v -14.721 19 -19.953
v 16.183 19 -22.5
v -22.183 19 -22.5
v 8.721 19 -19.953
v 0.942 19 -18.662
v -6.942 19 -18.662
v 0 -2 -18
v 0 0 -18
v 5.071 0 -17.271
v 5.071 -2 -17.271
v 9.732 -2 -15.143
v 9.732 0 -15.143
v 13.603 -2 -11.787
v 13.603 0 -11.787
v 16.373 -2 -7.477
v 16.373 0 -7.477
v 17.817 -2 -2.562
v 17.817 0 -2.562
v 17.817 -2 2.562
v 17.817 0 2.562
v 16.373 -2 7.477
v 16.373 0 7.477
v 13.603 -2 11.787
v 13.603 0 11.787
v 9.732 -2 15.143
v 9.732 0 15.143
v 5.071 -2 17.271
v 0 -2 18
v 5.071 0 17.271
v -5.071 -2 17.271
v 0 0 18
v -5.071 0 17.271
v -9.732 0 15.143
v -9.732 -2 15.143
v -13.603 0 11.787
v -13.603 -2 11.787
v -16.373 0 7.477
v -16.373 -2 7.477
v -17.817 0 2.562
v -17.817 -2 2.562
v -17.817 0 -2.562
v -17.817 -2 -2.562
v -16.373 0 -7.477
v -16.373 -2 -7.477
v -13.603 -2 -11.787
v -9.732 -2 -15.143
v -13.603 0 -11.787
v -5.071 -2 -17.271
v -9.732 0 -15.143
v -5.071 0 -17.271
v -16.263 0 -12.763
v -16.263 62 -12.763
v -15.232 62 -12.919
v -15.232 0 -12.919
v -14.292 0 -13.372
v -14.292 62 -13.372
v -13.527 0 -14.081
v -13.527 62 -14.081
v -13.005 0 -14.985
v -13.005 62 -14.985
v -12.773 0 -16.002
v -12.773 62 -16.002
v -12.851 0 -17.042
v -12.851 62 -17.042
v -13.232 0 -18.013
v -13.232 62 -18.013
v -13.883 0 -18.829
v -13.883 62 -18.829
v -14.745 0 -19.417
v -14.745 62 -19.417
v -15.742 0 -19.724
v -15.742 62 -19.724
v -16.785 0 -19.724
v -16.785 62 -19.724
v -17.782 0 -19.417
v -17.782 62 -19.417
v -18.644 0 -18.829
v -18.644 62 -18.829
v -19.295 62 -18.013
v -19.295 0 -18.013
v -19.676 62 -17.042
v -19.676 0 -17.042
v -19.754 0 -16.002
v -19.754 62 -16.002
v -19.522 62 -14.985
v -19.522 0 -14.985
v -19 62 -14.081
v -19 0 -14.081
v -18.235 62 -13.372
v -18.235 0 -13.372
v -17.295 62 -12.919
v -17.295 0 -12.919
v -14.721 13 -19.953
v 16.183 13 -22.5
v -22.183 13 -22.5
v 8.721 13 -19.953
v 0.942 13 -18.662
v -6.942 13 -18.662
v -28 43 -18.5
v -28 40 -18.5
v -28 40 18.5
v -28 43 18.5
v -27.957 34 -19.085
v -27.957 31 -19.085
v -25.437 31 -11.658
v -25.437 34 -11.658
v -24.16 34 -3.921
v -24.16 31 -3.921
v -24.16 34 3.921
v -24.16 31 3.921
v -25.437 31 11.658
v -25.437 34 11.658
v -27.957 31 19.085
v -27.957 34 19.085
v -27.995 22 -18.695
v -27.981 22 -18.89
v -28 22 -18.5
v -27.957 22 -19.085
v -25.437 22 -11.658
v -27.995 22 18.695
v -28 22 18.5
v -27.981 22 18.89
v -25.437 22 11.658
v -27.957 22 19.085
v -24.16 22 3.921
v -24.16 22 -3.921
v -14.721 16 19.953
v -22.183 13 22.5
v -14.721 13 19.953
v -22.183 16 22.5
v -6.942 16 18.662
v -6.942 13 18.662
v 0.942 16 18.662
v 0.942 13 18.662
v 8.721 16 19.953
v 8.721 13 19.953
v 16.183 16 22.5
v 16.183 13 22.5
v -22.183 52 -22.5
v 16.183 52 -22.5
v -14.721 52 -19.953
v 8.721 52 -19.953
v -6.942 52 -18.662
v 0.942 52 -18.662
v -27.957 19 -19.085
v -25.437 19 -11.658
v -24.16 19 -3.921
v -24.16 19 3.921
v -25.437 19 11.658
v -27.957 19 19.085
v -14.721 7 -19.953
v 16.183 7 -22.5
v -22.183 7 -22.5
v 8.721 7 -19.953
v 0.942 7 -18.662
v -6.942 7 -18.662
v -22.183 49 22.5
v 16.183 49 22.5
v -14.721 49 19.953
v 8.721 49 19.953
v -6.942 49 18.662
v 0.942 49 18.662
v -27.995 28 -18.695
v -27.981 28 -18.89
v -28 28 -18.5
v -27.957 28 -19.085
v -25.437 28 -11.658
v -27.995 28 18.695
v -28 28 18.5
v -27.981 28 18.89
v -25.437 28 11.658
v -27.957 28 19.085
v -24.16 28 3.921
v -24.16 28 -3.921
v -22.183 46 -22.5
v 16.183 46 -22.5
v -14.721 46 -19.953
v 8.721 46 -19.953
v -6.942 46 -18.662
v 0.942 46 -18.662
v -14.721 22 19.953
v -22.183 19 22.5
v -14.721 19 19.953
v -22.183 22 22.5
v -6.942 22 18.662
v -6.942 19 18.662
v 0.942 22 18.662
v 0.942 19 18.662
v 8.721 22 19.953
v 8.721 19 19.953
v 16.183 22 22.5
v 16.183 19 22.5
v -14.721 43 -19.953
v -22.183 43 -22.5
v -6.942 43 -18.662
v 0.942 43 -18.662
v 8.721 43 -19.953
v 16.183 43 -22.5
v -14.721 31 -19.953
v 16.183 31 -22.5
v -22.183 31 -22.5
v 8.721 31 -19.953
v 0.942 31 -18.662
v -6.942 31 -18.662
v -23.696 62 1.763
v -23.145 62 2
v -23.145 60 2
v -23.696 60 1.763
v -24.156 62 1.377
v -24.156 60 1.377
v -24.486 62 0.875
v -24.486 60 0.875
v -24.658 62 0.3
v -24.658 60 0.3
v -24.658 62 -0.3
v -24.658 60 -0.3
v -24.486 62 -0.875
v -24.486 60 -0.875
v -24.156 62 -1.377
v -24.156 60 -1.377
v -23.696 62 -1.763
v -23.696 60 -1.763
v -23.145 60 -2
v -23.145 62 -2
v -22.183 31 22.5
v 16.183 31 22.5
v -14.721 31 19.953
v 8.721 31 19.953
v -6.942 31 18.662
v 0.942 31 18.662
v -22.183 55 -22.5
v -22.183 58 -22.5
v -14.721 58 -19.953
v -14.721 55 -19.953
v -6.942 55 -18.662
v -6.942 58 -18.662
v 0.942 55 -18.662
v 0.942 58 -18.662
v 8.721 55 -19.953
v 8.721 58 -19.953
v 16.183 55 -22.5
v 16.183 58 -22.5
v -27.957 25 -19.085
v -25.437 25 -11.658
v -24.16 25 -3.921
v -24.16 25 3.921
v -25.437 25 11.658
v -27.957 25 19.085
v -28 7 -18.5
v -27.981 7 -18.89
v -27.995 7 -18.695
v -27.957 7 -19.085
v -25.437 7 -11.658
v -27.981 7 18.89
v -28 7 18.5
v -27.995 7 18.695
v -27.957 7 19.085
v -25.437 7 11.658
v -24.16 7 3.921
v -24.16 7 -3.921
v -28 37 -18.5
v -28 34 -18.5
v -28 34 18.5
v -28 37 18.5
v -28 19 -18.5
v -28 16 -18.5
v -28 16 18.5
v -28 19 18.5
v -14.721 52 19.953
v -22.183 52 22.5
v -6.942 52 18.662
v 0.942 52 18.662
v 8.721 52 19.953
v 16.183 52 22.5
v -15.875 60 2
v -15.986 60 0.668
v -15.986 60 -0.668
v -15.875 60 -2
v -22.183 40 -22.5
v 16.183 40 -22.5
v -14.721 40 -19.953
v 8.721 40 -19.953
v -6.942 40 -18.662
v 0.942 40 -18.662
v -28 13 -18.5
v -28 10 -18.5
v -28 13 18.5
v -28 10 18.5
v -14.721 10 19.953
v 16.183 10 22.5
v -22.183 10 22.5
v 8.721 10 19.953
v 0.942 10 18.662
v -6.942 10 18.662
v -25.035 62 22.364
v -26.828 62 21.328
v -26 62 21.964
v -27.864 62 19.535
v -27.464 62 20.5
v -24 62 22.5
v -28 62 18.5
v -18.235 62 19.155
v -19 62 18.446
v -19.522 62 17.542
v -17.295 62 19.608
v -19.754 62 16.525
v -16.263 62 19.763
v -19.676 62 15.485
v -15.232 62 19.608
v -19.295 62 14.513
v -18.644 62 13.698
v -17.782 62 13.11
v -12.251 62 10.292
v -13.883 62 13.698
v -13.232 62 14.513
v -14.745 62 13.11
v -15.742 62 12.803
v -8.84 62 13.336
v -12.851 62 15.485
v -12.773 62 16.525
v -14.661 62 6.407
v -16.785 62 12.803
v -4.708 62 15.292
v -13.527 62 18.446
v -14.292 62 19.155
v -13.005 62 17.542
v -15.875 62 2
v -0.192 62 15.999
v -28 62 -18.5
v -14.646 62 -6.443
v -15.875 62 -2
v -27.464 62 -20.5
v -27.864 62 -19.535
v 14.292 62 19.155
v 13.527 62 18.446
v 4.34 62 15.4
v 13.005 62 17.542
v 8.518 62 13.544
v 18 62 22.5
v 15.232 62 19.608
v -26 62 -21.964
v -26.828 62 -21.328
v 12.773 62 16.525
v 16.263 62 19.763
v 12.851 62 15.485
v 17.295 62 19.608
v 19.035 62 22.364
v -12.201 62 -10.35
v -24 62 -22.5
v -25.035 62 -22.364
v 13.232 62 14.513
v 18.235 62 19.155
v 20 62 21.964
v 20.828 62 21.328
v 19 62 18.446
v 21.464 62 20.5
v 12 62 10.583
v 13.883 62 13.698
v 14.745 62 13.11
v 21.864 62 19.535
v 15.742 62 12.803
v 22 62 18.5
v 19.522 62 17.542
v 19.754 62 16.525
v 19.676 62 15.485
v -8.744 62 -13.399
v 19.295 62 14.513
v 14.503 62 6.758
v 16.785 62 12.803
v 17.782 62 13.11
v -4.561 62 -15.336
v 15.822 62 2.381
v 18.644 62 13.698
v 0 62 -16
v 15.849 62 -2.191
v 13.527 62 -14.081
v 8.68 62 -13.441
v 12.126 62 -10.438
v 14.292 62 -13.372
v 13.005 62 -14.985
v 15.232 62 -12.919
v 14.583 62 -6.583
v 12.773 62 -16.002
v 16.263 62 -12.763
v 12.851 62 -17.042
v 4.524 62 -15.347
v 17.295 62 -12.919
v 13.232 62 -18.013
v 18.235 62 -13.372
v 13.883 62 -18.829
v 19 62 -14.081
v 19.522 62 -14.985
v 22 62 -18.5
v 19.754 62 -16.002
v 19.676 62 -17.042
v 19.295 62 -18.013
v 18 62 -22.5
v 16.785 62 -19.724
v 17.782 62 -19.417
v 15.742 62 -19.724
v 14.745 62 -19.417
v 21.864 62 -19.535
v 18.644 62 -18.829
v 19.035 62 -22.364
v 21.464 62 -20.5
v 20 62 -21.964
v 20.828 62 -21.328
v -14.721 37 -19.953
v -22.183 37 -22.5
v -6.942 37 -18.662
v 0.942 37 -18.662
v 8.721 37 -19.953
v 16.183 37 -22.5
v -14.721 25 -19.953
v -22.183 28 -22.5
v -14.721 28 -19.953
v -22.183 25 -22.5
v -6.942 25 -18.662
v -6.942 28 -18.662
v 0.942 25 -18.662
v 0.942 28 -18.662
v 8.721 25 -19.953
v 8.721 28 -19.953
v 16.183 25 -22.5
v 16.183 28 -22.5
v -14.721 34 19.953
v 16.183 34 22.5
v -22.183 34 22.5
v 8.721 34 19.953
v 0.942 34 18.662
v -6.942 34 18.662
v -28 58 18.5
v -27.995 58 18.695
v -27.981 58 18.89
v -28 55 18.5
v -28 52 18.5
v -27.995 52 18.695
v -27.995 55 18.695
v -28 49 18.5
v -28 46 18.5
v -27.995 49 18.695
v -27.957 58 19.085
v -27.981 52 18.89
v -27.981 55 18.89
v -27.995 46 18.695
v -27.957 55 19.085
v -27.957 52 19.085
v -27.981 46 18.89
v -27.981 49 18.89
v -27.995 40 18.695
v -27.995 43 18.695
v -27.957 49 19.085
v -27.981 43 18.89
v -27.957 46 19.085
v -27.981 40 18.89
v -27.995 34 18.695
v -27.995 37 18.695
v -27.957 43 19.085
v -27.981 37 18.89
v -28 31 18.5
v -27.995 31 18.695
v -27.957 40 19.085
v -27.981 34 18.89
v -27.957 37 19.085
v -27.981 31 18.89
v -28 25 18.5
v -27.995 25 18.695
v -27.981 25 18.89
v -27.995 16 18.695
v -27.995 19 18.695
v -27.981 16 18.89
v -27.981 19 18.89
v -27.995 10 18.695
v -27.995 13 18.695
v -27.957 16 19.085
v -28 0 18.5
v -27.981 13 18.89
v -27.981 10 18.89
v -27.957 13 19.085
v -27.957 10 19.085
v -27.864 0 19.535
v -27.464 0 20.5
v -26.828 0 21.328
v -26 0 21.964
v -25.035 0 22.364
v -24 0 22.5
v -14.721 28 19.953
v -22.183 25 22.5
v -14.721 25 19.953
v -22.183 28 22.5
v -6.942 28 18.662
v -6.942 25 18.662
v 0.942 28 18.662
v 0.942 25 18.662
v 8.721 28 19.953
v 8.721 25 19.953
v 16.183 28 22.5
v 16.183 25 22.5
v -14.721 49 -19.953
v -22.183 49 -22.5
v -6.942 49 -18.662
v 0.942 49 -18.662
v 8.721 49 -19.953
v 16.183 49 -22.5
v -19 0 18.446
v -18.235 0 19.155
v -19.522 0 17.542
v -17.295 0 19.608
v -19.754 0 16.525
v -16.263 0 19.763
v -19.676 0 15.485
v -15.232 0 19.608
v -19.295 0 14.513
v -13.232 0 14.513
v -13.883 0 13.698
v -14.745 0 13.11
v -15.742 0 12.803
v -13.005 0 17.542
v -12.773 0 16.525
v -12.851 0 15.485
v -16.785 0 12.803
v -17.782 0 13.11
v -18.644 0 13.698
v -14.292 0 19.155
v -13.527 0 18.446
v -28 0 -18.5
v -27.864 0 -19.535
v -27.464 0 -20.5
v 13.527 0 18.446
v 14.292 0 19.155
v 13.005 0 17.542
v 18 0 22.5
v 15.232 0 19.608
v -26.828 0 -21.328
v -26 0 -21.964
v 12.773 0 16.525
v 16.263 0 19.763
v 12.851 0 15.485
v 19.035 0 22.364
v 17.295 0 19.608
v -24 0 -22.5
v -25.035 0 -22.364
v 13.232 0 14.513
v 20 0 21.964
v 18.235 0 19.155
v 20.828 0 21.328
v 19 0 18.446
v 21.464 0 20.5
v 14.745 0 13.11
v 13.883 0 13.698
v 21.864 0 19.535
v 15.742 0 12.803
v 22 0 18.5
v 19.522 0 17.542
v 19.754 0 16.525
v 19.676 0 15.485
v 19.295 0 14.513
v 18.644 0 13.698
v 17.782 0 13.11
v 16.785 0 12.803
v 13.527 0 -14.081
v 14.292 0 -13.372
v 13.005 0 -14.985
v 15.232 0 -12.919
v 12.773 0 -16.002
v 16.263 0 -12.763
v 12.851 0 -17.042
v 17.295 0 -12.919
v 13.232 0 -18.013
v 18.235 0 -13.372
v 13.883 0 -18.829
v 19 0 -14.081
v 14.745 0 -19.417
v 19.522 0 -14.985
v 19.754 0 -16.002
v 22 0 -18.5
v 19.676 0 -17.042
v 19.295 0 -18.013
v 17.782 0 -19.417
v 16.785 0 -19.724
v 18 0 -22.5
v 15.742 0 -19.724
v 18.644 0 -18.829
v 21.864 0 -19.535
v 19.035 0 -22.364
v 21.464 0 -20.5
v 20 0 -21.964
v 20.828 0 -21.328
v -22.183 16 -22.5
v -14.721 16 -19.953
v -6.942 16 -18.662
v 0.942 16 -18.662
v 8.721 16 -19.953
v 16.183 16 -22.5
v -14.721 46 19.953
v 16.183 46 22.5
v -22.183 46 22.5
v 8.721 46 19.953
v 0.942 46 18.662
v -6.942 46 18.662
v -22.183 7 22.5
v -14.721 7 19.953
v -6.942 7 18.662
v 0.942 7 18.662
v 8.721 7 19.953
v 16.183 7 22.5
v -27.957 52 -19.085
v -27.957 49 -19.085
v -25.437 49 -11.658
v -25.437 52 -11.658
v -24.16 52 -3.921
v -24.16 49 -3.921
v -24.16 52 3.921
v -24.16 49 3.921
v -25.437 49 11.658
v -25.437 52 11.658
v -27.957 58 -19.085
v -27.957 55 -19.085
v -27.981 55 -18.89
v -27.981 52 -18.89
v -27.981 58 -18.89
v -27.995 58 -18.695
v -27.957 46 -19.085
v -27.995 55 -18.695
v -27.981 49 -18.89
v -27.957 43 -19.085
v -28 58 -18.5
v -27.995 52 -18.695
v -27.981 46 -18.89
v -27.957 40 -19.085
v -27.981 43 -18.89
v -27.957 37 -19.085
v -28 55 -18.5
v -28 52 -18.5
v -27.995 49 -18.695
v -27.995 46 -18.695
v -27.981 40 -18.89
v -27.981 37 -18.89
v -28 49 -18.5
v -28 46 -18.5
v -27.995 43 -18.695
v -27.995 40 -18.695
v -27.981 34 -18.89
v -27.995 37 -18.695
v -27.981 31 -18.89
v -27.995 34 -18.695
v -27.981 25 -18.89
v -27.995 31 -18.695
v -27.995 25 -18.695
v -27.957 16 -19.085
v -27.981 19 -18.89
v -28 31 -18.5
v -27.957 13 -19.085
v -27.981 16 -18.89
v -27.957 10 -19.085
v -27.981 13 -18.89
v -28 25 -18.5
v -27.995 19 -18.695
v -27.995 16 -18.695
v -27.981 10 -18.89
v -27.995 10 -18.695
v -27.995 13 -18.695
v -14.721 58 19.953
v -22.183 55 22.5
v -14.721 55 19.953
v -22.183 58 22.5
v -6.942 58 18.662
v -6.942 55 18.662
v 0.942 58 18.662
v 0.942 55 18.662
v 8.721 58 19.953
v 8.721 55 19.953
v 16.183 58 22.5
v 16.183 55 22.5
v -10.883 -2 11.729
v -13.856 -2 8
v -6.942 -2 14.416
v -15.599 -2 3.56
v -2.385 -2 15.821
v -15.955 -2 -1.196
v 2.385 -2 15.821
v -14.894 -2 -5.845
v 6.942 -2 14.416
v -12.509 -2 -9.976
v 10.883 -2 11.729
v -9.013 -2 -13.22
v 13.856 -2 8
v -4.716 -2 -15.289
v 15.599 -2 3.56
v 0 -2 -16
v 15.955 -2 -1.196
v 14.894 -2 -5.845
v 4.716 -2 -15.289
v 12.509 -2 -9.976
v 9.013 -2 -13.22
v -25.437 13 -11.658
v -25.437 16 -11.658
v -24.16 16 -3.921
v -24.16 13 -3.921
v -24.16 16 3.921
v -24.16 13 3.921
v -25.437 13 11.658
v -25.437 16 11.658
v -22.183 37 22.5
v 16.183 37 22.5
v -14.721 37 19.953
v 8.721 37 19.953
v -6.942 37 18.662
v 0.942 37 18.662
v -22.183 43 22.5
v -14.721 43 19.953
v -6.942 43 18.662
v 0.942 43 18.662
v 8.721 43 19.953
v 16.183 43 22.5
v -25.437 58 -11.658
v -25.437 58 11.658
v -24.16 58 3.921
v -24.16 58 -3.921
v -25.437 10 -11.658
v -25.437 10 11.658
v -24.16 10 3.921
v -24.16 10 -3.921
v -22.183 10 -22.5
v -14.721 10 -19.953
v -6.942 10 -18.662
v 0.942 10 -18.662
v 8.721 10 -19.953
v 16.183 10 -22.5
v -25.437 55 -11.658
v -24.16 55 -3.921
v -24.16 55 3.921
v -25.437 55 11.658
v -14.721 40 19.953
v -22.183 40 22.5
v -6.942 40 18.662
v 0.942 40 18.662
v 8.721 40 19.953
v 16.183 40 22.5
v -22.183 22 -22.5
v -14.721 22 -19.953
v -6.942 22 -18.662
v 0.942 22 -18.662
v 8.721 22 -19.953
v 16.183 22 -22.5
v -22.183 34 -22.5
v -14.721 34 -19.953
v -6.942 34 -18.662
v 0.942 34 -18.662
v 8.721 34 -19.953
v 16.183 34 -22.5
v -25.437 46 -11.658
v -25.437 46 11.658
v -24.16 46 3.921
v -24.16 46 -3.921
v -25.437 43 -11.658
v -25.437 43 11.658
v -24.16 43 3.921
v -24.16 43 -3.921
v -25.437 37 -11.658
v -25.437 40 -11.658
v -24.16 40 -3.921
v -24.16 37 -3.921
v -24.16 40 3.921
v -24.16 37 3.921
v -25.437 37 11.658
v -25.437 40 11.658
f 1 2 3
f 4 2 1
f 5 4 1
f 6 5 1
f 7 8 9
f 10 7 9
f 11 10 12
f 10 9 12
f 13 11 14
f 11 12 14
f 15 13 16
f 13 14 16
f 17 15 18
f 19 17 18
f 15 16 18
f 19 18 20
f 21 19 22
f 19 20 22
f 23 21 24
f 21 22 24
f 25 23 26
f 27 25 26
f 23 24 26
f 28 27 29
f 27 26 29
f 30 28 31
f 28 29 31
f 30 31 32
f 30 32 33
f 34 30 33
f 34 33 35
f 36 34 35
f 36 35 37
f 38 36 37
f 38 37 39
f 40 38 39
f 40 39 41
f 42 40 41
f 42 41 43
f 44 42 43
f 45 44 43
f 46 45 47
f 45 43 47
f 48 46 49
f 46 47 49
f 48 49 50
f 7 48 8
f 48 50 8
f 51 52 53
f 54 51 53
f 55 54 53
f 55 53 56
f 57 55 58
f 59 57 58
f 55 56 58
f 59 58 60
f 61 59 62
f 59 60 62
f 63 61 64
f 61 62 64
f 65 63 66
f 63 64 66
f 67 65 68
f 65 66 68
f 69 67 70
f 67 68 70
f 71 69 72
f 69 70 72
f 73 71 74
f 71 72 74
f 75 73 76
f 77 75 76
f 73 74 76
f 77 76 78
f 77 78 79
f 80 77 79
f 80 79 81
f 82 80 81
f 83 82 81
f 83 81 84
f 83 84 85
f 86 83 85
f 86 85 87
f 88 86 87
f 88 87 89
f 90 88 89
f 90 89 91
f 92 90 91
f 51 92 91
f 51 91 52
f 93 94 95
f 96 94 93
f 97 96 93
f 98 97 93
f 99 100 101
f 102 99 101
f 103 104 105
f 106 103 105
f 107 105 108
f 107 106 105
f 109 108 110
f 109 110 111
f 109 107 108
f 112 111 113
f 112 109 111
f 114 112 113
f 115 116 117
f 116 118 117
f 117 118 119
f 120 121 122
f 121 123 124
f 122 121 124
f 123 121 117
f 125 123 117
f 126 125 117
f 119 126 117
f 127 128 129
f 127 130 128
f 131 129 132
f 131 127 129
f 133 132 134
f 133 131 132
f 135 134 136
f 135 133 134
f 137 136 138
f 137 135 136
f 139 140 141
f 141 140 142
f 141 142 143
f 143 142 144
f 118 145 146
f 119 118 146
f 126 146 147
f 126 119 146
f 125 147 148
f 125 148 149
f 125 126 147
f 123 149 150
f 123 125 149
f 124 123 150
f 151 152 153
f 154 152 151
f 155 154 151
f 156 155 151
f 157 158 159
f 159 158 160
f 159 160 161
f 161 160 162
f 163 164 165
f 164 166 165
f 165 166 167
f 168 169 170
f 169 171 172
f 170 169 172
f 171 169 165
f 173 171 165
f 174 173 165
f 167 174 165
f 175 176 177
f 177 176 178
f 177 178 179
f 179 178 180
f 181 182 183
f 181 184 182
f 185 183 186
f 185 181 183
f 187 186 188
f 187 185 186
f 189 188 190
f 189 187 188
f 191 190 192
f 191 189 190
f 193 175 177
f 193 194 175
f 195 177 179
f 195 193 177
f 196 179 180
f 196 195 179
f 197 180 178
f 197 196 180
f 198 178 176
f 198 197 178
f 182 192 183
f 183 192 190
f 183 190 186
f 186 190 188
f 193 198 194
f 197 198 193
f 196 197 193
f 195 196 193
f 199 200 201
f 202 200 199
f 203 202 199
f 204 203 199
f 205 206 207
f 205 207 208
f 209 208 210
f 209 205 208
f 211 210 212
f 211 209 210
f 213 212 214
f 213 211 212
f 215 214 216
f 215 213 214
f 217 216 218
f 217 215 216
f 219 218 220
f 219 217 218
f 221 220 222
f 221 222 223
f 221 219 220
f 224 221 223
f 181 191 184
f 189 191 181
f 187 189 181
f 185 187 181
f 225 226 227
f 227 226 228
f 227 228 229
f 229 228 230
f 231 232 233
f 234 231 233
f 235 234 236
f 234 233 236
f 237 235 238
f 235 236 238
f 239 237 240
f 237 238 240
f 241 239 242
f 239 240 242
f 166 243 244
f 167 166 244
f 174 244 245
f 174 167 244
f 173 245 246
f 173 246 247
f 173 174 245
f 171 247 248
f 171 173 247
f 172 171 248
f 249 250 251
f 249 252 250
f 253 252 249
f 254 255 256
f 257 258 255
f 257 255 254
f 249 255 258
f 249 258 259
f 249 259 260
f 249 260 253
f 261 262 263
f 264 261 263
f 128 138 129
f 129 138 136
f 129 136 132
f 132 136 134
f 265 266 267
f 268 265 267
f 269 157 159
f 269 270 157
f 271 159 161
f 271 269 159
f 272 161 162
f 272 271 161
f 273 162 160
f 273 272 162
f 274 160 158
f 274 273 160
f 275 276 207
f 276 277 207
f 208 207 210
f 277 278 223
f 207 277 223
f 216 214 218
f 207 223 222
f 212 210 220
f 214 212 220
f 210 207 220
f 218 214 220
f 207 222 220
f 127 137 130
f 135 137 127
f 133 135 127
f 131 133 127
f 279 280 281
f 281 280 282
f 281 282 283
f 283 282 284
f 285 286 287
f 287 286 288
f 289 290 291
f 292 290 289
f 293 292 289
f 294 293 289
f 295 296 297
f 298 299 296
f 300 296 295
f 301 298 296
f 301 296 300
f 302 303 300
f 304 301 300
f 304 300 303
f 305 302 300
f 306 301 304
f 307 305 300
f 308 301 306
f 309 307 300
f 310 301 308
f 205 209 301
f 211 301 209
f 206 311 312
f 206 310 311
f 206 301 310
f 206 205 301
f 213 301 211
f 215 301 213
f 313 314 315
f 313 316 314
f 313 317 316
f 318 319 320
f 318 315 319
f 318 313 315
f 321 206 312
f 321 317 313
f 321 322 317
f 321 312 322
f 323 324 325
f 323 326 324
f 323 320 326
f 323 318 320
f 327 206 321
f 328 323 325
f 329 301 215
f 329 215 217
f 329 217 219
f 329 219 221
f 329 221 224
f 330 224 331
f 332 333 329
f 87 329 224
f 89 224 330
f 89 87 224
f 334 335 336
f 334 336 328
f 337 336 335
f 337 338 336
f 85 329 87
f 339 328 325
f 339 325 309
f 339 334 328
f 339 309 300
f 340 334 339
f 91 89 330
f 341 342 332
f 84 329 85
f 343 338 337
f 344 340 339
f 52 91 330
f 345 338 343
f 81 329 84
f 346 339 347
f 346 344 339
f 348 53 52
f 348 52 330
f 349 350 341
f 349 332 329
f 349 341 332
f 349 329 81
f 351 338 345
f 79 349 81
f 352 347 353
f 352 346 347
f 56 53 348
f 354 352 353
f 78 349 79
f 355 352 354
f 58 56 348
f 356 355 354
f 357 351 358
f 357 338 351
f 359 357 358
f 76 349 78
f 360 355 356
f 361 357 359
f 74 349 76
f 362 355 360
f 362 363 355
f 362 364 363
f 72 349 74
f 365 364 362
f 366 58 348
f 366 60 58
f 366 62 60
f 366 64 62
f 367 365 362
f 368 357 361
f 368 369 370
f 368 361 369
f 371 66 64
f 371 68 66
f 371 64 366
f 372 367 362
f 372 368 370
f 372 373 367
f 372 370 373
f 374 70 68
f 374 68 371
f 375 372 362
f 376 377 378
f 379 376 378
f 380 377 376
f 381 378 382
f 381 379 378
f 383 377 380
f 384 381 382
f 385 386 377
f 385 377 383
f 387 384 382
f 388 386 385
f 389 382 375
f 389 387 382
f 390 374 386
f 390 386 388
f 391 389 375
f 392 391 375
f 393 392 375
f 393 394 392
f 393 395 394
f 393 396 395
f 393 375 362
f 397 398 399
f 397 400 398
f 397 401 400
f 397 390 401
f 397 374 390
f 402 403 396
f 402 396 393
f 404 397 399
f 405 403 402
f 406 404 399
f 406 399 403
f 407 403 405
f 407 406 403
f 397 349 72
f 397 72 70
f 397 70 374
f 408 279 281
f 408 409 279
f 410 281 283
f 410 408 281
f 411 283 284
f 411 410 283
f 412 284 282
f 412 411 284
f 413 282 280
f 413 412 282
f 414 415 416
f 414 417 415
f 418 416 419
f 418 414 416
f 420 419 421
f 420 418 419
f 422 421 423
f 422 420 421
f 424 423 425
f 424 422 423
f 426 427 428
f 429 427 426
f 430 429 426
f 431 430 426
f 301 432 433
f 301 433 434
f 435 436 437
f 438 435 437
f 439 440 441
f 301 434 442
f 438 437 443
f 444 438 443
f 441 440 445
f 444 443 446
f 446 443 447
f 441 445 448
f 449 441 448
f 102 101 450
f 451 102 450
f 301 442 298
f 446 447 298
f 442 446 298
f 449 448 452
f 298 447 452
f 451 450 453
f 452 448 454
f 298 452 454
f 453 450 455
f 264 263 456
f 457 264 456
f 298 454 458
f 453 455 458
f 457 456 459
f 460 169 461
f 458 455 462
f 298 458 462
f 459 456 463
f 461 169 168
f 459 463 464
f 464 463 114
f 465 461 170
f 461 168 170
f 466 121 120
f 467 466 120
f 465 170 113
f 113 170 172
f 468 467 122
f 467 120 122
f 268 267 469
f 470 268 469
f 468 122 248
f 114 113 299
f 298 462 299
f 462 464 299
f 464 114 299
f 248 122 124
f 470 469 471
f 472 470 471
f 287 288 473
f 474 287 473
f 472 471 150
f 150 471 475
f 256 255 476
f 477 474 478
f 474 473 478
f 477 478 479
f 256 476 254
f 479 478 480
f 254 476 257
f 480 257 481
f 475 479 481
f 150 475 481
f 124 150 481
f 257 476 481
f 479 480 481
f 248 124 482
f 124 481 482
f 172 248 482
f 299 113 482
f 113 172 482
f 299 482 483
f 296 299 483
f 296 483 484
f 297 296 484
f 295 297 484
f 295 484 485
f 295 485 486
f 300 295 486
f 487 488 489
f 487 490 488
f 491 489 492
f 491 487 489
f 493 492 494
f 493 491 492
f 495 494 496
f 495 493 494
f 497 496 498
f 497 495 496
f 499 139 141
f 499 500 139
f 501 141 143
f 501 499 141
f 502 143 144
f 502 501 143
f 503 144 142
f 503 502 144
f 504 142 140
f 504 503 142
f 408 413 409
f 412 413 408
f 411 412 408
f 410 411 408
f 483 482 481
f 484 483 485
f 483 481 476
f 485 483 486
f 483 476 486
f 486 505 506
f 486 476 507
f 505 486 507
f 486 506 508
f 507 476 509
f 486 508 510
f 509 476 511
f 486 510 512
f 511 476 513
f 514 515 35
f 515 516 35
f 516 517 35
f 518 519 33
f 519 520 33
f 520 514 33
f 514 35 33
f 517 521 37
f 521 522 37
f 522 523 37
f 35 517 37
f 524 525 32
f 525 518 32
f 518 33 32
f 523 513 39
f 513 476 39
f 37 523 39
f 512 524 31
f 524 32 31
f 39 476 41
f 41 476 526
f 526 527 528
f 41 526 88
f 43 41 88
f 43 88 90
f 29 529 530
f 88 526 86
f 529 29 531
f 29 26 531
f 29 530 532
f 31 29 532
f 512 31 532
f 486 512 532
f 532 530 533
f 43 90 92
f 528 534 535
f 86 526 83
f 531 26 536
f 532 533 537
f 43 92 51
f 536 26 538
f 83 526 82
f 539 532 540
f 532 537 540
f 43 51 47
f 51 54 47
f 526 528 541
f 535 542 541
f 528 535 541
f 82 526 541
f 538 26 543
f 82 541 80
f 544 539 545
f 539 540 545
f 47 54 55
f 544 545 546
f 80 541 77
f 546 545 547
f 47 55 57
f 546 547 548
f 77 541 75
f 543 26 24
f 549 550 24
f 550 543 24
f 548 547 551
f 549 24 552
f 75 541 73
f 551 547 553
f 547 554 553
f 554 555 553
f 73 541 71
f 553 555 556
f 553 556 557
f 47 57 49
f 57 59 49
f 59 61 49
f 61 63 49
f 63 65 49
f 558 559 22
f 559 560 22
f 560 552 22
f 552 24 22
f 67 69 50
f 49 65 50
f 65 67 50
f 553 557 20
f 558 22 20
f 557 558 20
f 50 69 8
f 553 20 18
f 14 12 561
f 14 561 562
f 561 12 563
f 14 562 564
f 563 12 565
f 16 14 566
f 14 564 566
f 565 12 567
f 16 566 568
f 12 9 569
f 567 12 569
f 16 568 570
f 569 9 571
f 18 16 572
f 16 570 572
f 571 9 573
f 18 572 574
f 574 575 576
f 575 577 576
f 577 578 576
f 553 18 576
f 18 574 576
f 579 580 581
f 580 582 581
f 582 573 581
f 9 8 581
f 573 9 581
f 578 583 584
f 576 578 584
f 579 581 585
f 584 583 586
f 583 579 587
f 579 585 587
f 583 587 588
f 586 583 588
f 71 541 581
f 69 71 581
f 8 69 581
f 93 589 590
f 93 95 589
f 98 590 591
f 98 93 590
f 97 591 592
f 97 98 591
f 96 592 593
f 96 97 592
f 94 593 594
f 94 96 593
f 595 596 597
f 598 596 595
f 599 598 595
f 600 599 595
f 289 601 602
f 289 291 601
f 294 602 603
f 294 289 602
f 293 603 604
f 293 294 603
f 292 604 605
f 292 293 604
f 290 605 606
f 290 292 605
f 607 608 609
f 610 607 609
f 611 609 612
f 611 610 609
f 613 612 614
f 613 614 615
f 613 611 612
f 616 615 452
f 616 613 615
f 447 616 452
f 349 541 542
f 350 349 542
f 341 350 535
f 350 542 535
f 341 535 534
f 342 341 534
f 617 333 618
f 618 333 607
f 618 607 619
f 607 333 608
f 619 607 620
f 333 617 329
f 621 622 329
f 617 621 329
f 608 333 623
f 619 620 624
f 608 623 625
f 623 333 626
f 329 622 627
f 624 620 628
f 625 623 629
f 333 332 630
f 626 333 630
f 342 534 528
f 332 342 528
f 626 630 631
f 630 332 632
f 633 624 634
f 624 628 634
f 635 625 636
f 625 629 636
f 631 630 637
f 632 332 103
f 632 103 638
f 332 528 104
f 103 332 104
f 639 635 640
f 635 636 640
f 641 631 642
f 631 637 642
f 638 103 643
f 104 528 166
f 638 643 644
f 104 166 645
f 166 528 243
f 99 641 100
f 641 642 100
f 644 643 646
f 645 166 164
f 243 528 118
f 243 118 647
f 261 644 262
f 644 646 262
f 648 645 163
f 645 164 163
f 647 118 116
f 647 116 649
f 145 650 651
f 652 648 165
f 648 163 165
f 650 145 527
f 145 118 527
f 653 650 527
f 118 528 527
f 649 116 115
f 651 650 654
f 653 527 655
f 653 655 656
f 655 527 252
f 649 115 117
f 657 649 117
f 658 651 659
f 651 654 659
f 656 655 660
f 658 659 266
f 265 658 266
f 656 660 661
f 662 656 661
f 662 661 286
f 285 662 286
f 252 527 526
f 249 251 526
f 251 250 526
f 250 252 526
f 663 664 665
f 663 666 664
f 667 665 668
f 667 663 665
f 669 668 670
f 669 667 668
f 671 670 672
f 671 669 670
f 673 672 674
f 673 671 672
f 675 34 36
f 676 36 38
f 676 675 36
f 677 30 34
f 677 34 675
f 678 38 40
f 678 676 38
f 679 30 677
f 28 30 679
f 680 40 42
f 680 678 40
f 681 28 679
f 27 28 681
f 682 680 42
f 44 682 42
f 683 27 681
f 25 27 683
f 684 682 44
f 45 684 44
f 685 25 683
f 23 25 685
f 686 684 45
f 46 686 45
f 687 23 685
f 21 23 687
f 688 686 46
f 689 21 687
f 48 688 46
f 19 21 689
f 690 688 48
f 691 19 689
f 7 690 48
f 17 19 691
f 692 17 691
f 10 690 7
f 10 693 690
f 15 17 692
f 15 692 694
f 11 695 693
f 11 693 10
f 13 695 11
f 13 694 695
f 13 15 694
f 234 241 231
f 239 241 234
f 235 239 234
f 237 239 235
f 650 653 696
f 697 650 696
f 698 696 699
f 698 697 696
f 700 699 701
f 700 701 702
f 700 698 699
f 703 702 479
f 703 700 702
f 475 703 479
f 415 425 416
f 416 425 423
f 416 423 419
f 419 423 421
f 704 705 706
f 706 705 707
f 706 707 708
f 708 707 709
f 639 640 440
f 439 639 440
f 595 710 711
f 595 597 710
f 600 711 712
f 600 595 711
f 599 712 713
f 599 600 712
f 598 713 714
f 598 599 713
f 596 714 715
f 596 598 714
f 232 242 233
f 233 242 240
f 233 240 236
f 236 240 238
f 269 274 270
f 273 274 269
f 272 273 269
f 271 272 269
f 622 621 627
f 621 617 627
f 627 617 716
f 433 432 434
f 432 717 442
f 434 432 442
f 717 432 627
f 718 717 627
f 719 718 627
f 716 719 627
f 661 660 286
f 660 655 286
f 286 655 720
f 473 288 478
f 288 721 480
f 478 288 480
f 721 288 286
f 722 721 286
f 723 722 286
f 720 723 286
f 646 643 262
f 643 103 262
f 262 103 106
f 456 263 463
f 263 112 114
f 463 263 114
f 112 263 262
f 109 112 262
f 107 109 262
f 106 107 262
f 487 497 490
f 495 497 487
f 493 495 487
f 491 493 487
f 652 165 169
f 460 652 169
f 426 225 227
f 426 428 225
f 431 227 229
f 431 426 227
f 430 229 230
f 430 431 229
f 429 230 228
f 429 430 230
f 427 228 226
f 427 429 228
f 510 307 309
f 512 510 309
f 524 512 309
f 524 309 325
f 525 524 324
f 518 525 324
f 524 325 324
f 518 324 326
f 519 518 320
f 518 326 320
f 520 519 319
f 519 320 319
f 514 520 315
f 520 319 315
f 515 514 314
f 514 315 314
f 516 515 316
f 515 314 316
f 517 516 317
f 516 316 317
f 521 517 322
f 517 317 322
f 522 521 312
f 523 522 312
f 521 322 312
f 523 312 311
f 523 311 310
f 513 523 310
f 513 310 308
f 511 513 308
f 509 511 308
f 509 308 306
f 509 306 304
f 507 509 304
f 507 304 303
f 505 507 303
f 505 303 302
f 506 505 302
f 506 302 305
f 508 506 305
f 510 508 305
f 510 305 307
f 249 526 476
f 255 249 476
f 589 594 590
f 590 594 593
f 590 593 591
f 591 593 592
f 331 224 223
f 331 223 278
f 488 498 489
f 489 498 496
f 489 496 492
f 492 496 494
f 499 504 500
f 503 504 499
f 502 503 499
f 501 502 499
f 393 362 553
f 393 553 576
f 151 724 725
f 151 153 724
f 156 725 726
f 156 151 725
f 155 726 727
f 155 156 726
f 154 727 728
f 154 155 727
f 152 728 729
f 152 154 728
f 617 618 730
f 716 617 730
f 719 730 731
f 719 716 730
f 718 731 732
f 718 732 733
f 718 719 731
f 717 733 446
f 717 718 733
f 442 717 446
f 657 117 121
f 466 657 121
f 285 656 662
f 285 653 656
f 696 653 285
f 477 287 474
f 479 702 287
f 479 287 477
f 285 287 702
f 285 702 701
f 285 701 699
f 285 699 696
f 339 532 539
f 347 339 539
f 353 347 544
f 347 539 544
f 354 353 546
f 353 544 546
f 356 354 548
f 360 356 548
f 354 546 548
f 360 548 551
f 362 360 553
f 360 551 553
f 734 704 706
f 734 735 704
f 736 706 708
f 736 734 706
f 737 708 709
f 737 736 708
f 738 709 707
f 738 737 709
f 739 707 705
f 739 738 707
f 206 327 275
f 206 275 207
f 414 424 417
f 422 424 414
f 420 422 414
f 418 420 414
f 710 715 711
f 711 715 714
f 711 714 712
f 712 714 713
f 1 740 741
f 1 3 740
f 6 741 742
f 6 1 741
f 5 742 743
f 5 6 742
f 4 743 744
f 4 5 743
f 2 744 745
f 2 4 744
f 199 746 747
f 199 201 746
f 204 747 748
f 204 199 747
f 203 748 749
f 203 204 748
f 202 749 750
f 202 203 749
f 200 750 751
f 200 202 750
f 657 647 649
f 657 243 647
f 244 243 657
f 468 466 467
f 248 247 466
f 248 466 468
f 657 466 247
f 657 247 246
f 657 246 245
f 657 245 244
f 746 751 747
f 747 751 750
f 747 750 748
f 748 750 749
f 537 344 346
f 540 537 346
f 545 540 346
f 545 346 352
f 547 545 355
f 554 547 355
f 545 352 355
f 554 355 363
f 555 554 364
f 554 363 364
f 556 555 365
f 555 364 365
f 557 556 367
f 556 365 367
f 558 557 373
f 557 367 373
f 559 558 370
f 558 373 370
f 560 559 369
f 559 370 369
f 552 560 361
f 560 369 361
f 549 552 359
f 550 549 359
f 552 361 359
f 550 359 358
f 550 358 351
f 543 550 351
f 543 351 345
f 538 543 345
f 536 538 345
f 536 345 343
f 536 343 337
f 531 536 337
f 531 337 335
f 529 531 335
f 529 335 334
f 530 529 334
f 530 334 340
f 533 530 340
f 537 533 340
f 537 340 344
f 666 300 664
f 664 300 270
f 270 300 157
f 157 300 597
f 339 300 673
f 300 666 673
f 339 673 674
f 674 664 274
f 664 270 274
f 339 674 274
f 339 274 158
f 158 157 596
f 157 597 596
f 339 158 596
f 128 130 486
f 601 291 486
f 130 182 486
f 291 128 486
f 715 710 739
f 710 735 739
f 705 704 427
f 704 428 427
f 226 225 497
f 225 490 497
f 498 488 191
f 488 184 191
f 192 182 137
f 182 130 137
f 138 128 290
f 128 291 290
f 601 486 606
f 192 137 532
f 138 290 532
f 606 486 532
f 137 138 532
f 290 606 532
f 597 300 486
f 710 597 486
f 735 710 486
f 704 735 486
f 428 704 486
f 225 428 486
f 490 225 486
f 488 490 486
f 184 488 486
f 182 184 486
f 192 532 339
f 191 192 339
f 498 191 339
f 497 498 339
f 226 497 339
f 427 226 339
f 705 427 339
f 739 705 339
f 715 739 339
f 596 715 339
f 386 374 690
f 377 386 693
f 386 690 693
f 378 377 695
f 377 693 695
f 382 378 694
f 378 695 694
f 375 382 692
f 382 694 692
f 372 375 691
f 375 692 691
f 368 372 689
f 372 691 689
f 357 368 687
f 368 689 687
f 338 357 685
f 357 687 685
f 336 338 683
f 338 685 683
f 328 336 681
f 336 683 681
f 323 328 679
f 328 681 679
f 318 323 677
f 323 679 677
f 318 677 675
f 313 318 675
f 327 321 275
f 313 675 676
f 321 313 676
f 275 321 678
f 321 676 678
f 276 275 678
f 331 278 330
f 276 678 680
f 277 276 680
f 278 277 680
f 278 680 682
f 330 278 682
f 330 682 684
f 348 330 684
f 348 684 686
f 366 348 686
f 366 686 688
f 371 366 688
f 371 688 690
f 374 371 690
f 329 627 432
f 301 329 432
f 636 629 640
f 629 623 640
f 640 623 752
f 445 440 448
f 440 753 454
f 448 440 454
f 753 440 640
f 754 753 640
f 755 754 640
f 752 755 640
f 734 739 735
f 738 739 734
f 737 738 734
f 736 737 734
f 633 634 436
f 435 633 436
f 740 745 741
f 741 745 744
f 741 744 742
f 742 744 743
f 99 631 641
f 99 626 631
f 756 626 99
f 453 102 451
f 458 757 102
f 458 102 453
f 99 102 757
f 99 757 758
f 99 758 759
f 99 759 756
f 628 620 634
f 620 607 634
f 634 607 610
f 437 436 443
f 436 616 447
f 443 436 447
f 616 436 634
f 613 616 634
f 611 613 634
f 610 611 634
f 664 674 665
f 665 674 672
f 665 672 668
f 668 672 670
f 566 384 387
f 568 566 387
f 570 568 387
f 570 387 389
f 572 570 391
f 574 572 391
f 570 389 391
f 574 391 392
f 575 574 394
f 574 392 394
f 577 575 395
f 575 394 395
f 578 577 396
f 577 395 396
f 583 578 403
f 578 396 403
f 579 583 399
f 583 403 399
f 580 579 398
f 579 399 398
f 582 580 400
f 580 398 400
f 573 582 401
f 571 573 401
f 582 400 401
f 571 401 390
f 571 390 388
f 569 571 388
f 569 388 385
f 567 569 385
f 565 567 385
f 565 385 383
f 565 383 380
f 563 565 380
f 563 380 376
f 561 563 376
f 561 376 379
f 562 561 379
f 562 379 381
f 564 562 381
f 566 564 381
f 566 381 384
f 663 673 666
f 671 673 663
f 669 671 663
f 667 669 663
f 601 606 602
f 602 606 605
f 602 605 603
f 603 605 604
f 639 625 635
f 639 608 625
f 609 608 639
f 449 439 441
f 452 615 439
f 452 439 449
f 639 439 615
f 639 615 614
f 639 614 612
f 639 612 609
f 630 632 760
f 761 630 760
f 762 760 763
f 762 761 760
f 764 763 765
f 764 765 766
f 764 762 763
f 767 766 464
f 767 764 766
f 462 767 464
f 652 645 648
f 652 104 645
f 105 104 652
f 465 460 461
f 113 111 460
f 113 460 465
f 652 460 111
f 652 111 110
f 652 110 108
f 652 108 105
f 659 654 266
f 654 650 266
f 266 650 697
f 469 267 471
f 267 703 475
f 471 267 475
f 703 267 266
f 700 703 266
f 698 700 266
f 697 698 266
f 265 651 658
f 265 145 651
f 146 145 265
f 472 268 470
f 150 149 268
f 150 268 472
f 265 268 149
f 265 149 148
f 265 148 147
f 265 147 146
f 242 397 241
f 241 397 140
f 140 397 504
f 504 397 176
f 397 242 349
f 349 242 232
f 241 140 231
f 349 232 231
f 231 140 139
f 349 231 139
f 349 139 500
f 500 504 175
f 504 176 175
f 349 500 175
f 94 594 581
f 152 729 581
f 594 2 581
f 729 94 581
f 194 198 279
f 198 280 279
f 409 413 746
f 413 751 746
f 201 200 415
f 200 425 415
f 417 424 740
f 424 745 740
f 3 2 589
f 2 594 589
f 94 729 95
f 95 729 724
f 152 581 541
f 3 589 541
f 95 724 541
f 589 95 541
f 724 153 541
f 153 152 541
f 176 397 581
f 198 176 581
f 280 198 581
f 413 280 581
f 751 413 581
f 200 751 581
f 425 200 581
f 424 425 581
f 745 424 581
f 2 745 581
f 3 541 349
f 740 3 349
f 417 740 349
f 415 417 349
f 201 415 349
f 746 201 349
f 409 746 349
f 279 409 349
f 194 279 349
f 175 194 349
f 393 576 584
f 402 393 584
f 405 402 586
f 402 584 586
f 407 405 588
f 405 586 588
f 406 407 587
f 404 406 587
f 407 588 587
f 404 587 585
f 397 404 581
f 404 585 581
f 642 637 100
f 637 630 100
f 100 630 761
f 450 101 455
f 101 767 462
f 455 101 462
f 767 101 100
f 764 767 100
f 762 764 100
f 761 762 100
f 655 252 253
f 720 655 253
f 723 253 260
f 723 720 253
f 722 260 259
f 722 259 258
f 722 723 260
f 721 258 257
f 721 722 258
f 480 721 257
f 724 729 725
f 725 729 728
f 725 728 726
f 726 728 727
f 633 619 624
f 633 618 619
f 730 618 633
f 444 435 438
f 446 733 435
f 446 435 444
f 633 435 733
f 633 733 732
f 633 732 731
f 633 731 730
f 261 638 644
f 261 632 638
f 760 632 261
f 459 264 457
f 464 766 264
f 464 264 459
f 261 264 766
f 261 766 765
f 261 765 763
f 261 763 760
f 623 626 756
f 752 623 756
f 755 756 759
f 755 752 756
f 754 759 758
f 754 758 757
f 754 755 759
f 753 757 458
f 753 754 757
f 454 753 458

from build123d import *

# Parameters (mm, degrees)
BOSS_EXTRUDE1_DEPTH     = 62
SKETCH2_R               = 18
BOSS_EXTRUDE2_DEPTH     = 2
SKETCH3_R               = 16
CUT_EXTRUDE1_DEPTH      = 74.391075752
CUT_EXTRUDE2_DEPTH      = 2
SKETCH5_R               = 3.5
CUT_EXTRUDE3_DEPTH      = 74.391075752
SKETCH6_W               = 48
SKETCH6_H               = 3
LPATTERN1_COUNT         = 9
LPATTERN1_PITCH         = 6
MIRROR1_COPY_1_SKETCH_W = 48
MIRROR1_COPY_1_SKETCH_H = 3
MIRROR1_COPY_2_SKETCH_W = 48
MIRROR1_COPY_2_SKETCH_H = 3
MIRROR1_COPY_3_SKETCH_W = 48
MIRROR1_COPY_3_SKETCH_H = 3
MIRROR1_COPY_4_SKETCH_W = 48
MIRROR1_COPY_4_SKETCH_H = 3
MIRROR1_COPY_5_SKETCH_W = 48
MIRROR1_COPY_5_SKETCH_H = 3
MIRROR1_COPY_6_SKETCH_W = 48
MIRROR1_COPY_6_SKETCH_H = 3
MIRROR1_COPY_7_SKETCH_W = 48
MIRROR1_COPY_7_SKETCH_H = 3
MIRROR1_COPY_8_SKETCH_W = 48
MIRROR1_COPY_8_SKETCH_H = 3
SKETCH10_W              = 48
SKETCH10_H              = 3
LPATTERN2_COUNT         = 9
LPATTERN2_PITCH         = 6


with BuildPart() as part:
    # Sketch1 → Boss-Extrude1 (new body)
    with BuildSketch(Plane(origin=(0, 0, 0), x_dir=(1, 0, 0), z_dir=(0, 1, 0))):
        with BuildLine():
            Line((-24, -22.5), (18, -22.5))
            ThreePointArc((18, -22.5), (20.828427125, -21.328427125), (22, -18.5))
            Line((22, -18.5), (22, 18.5))
            ThreePointArc((22, 18.5), (20.828427125, 21.328427125), (18, 22.5))
            Line((18, 22.5), (-24, 22.5))
            ThreePointArc((-24, 22.5), (-26.828427125, 21.328427125), (-28, 18.5))
            Line((-28, 18.5), (-28, -18.5))
            ThreePointArc((-28, -18.5), (-26.828427125, -21.328427125), (-24, -22.5))
        make_face()
    extrude(amount=BOSS_EXTRUDE1_DEPTH)

    # Sketch2 → Boss-Extrude2 (add)
    with BuildSketch(Plane.XZ):
        with Locations(Location((0, 0, 0), (0, 0, 270))):
            Circle(SKETCH2_R)
    extrude(amount=BOSS_EXTRUDE2_DEPTH)

    # Sketch3 → Cut-Extrude1 (cut, through all)
    with BuildSketch(Plane.XZ.offset(2)):
        with Locations(Location((0, 0, 0), (0, 0, 270))):
            Circle(SKETCH3_R)
    extrude(amount=-CUT_EXTRUDE1_DEPTH, mode=Mode.SUBTRACT)

    # Sketch4 → Cut-Extrude2 (cut)
    with BuildSketch(Plane(origin=(0, 62, 0), x_dir=(1, 0, 0), z_dir=(0, 1, 0))):
        with BuildLine():
            Line((-23.144533893, 2), (-8.5852446, 2))
            Line((-8.5852446, 2), (-8.5852446, -2))
            Line((-8.5852446, -2), (-23.144533893, -2))
            ThreePointArc((-23.144533893, -2), (-24.680199624, 0), (-23.144533893, 2))
        make_face()
    extrude(amount=-CUT_EXTRUDE2_DEPTH, mode=Mode.SUBTRACT)

    # Sketch5 → Cut-Extrude3 (cut, through all)
    with BuildSketch(Plane(origin=(0, 62, 0), x_dir=(1, 0, 0), z_dir=(0, 1, 0))):
        with Locations(Location((16.263455967, 16.263455967, 0), (0, 0, 270))):
            Circle(SKETCH5_R)
        with Locations(Location((16.263455967, -16.263455967, 0), (0, 0, 270))):
            Circle(SKETCH5_R)
        with Locations(Location((-16.263455967, -16.263455967, 0), (0, 0, 270))):
            Circle(SKETCH5_R)
        with Locations(Location((-16.263455967, 16.263455967, 0), (0, 0, 270))):
            Circle(SKETCH5_R)
    extrude(amount=-CUT_EXTRUDE3_DEPTH, mode=Mode.SUBTRACT)

    # Sketch6 → Cut-Revolve1 (revolve, cut)
    with BuildSketch(Plane(origin=(-3, 0, 0), x_dir=(0, 0, -1), z_dir=(1, 0, 0))):
        with Locations((-42.5, 56.5)):
            Rectangle(SKETCH6_W, SKETCH6_H)
    cut_revolve1 = revolve(axis=Axis((-3, 58, 66.5), (0, -1, 0)), mode=Mode.SUBTRACT)

    # LPattern1: Cut-Revolve1 ×9
    with Locations(*[(0, -i * LPATTERN1_PITCH, 0) for i in range(1, LPATTERN1_COUNT)]):
        add(cut_revolve1, mode=Mode.SUBTRACT)

    # Mirror1: Cut-Revolve1 across plane
    add(cut_revolve1.mirror(Plane.XY), mode=Mode.SUBTRACT)

    # Mirror1 copy 1 sketch → Mirror1 copy 1 (revolve, cut)
    with BuildSketch(Plane(origin=(-3, -6, 0), x_dir=(0, 0, 1), z_dir=(1, 0, 0))):
        with Locations((-42.5, -56.5)):
            Rectangle(MIRROR1_COPY_1_SKETCH_W, MIRROR1_COPY_1_SKETCH_H)
    revolve(axis=Axis((-3, 52, -66.5), (0, 1, 0)), mode=Mode.SUBTRACT)

    # Mirror1 copy 2 sketch → Mirror1 copy 2 (revolve, cut)
    with BuildSketch(Plane(origin=(-3, -12, 0), x_dir=(0, 0, 1), z_dir=(1, 0, 0))):
        with Locations((-42.5, -56.5)):
            Rectangle(MIRROR1_COPY_2_SKETCH_W, MIRROR1_COPY_2_SKETCH_H)
    revolve(axis=Axis((-3, 46, -66.5), (0, 1, 0)), mode=Mode.SUBTRACT)

    # Mirror1 copy 3 sketch → Mirror1 copy 3 (revolve, cut)
    with BuildSketch(Plane(origin=(-3, -18, 0), x_dir=(0, 0, 1), z_dir=(1, 0, 0))):
        with Locations((-42.5, -56.5)):
            Rectangle(MIRROR1_COPY_3_SKETCH_W, MIRROR1_COPY_3_SKETCH_H)
    revolve(axis=Axis((-3, 40, -66.5), (0, 1, 0)), mode=Mode.SUBTRACT)

    # Mirror1 copy 4 sketch → Mirror1 copy 4 (revolve, cut)
    with BuildSketch(Plane(origin=(-3, -24, 0), x_dir=(0, 0, 1), z_dir=(1, 0, 0))):
        with Locations((-42.5, -56.5)):
            Rectangle(MIRROR1_COPY_4_SKETCH_W, MIRROR1_COPY_4_SKETCH_H)
    revolve(axis=Axis((-3, 34, -66.5), (0, 1, 0)), mode=Mode.SUBTRACT)

    # Mirror1 copy 5 sketch → Mirror1 copy 5 (revolve, cut)
    with BuildSketch(Plane(origin=(-3, -30, 0), x_dir=(0, 0, 1), z_dir=(1, 0, 0))):
        with Locations((-42.5, -56.5)):
            Rectangle(MIRROR1_COPY_5_SKETCH_W, MIRROR1_COPY_5_SKETCH_H)
    revolve(axis=Axis((-3, 28, -66.5), (0, 1, 0)), mode=Mode.SUBTRACT)

    # Mirror1 copy 6 sketch → Mirror1 copy 6 (revolve, cut)
    with BuildSketch(Plane(origin=(-3, -36, 0), x_dir=(0, 0, 1), z_dir=(1, 0, 0))):
        with Locations((-42.5, -56.5)):
            Rectangle(MIRROR1_COPY_6_SKETCH_W, MIRROR1_COPY_6_SKETCH_H)
    revolve(axis=Axis((-3, 22, -66.5), (0, 1, 0)), mode=Mode.SUBTRACT)

    # Mirror1 copy 7 sketch → Mirror1 copy 7 (revolve, cut)
    with BuildSketch(Plane(origin=(-3, -42, 0), x_dir=(0, 0, 1), z_dir=(1, 0, 0))):
        with Locations((-42.5, -56.5)):
            Rectangle(MIRROR1_COPY_7_SKETCH_W, MIRROR1_COPY_7_SKETCH_H)
    revolve(axis=Axis((-3, 16, -66.5), (0, 1, 0)), mode=Mode.SUBTRACT)

    # Mirror1 copy 8 sketch → Mirror1 copy 8 (revolve, cut)
    with BuildSketch(Plane(origin=(-3, -48, 0), x_dir=(0, 0, 1), z_dir=(1, 0, 0))):
        with Locations((-42.5, -56.5)):
            Rectangle(MIRROR1_COPY_8_SKETCH_W, MIRROR1_COPY_8_SKETCH_H)
    revolve(axis=Axis((-3, 10, -66.5), (0, 1, 0)), mode=Mode.SUBTRACT)

    # Sketch10 → Cut-Revolve2 (revolve, cut)
    with BuildSketch(Plane.XY):
        with Locations((-48, 56.5)):
            Rectangle(SKETCH10_W, SKETCH10_H)
    cut_revolve2 = revolve(axis=Axis((-72, 58, 0), (0, -1, 0)), mode=Mode.SUBTRACT)

    # LPattern2: Cut-Revolve2 ×9
    with Locations(*[(0, -i * LPATTERN2_PITCH, 0) for i in range(1, LPATTERN2_COUNT)]):
        add(cut_revolve2, mode=Mode.SUBTRACT)


solid = part.part
